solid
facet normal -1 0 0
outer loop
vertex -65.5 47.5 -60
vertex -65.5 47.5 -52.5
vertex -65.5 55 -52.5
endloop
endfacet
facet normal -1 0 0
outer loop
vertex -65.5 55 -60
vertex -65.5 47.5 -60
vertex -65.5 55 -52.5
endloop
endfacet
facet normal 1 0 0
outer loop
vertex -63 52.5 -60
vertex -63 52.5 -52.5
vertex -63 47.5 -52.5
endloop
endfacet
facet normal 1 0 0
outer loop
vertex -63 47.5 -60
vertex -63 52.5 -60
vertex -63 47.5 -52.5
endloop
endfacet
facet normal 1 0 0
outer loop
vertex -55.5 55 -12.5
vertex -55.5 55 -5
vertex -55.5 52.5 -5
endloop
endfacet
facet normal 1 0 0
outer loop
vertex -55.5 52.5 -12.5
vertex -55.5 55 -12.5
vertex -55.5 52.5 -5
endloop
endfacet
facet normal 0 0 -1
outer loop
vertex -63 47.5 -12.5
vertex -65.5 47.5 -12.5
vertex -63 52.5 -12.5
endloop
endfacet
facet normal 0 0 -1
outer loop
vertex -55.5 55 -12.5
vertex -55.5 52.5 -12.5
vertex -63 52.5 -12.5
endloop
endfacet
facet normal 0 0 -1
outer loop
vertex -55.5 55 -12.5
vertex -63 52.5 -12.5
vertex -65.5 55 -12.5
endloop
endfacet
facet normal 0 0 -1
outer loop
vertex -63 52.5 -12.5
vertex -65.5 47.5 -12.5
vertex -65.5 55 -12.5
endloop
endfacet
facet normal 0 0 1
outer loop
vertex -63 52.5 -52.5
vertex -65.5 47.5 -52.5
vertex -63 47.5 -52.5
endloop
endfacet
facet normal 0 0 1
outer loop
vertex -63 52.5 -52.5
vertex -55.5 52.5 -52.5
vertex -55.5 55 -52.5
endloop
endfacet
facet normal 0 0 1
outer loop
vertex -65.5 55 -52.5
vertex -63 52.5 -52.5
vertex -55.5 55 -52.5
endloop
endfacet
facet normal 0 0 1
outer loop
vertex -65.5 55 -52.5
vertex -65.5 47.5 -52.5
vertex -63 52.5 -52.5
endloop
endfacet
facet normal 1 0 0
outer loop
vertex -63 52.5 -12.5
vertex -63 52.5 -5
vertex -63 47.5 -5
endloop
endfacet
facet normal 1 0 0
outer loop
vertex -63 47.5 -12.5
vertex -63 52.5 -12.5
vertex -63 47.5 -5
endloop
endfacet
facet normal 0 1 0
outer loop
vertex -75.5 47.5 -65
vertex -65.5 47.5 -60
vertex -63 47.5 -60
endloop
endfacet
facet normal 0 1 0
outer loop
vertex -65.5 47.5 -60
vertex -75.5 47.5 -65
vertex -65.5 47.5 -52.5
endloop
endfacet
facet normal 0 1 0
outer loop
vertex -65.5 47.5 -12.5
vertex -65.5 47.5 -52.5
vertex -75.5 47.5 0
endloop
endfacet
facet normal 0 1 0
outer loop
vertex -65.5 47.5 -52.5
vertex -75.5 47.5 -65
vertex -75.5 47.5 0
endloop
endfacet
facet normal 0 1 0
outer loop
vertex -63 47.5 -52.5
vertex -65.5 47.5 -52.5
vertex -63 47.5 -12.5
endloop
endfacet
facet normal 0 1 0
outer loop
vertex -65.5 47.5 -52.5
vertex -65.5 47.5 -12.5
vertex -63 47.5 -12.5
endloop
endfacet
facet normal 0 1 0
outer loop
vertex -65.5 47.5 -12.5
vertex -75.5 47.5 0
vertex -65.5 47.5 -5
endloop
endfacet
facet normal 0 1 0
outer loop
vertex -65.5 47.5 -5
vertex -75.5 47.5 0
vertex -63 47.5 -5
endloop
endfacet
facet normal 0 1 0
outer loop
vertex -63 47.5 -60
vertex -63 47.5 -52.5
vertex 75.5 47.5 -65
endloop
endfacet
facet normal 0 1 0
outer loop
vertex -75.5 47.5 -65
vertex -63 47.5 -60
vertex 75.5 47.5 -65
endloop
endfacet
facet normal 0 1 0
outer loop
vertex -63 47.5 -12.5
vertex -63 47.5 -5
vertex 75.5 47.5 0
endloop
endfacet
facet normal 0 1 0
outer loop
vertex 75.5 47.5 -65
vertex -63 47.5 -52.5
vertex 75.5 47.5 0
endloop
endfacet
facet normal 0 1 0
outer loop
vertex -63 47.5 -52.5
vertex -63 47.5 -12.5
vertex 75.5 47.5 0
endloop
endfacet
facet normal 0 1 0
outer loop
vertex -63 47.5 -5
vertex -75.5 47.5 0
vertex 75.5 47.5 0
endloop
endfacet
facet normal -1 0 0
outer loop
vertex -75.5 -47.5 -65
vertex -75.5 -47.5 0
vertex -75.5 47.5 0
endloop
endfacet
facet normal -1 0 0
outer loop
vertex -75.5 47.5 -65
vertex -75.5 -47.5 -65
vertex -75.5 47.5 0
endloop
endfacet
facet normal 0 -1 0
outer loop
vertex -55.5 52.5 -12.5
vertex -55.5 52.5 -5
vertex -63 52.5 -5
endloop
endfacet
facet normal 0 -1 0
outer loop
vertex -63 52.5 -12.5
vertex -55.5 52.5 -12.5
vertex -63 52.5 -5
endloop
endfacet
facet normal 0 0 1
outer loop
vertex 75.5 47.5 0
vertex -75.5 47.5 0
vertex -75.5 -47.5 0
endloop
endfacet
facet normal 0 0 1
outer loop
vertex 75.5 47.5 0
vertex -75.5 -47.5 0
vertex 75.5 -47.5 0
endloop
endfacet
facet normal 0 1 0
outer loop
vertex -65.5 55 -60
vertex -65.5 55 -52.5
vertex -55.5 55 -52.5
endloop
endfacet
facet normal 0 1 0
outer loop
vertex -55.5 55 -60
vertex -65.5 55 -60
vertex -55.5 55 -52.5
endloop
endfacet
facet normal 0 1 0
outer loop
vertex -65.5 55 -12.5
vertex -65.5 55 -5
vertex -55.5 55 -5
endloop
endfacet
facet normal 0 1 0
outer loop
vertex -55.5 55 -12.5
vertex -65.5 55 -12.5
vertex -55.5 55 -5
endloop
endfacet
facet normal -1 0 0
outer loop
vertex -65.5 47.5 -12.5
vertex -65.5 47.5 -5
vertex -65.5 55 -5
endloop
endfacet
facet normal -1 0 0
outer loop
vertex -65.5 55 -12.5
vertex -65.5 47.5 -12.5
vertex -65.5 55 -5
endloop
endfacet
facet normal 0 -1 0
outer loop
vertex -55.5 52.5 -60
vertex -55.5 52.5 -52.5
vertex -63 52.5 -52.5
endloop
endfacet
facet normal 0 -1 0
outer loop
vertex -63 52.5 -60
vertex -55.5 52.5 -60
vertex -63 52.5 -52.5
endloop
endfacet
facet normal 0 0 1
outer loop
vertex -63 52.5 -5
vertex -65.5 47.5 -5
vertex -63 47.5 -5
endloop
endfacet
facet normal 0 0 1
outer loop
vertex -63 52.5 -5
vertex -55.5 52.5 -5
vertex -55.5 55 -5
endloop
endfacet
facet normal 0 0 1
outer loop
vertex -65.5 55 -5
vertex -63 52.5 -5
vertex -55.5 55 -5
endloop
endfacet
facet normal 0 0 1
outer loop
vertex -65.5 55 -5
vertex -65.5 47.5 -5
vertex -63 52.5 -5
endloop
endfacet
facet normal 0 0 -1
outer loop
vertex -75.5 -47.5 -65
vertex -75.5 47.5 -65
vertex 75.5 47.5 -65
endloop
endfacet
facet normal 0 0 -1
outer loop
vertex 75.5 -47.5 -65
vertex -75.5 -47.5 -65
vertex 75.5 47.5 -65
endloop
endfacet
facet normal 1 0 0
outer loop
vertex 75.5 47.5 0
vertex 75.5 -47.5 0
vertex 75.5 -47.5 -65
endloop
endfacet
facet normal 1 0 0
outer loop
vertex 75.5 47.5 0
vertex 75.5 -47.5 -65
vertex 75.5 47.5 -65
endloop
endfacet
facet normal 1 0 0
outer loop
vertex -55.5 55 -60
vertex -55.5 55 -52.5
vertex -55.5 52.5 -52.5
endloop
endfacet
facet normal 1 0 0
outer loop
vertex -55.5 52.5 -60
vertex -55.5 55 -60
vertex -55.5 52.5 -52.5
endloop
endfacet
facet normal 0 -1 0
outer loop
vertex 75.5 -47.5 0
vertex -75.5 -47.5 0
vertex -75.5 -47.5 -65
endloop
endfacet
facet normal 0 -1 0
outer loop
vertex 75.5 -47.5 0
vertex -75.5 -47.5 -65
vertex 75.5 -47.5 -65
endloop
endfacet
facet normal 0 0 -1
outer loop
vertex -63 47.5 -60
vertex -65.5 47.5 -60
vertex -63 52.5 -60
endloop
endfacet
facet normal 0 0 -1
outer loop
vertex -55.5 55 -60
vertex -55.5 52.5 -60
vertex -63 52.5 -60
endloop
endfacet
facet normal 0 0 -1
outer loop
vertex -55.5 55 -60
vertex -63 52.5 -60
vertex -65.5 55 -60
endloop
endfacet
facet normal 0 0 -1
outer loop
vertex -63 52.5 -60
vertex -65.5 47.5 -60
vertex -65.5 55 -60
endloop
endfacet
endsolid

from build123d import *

# Parameters (mm, degrees)
SKETCH1_W           = 151
SKETCH1_H           = 95
BOSS_EXTRUDE1_DEPTH = 65
BOSS_EXTRUDE2_DEPTH = 65
CUT_EXTRUDE1_REACH  = 143
SKETCH3_W           = 5
SKETCH3_H           = 7.5
SKETCH3_W_2         = 40


with BuildPart() as part:
    # Sketch1 → Boss-Extrude1 (new body)
    with BuildSketch(Plane.XY):
        Rectangle(SKETCH1_W, SKETCH1_H)
    extrude(amount=-BOSS_EXTRUDE1_DEPTH)

    # Sketch2 → Boss-Extrude2 (add)
    with BuildSketch(Plane.XY):
        Polygon((-65.5, 47.5), (-65.5, 55), (-55.5, 55), (-55.5, 52.5), (-63, 52.5), (-63, 47.5), align=None)
    extrude(amount=-BOSS_EXTRUDE2_DEPTH)

    # Sketch3 → Cut-Extrude1 (cut, up to next)
    with BuildSketch(Plane.ZY.offset(65.5), mode=Mode.PRIVATE) as cut_extrude1_sk1:
        with Locations((-62.5, 51.25)):
            Rectangle(SKETCH3_W, SKETCH3_H)
    cut_extrude1_tool1 = extrude(cut_extrude1_sk1.sketch, amount=-CUT_EXTRUDE1_REACH, mode=Mode.PRIVATE) & part.part
    add(cut_extrude1_tool1.solids().sort_by_distance((-65.5, 51.25, -62.5))[0], mode=Mode.SUBTRACT)
    # Sketch3 → Cut-Extrude1 (cut, up to next)
    with BuildSketch(Plane.ZY.offset(65.5), mode=Mode.PRIVATE) as cut_extrude1_sk2:
        with Locations((-32.5, 51.25)):
            Rectangle(SKETCH3_W_2, SKETCH3_H)
    cut_extrude1_tool2 = extrude(cut_extrude1_sk2.sketch, amount=-CUT_EXTRUDE1_REACH, mode=Mode.PRIVATE) & part.part
    add(cut_extrude1_tool2.solids().sort_by_distance((-65.5, 51.25, -32.5))[0], mode=Mode.SUBTRACT)
    # Sketch3 → Cut-Extrude1 (cut, up to next)
    with BuildSketch(Plane.ZY.offset(65.5), mode=Mode.PRIVATE) as cut_extrude1_sk3:
        with Locations((-2.5, 51.25)):
            Rectangle(SKETCH3_W, SKETCH3_H)
    cut_extrude1_tool3 = extrude(cut_extrude1_sk3.sketch, amount=-CUT_EXTRUDE1_REACH, mode=Mode.PRIVATE) & part.part
    add(cut_extrude1_tool3.solids().sort_by_distance((-65.5, 51.25, -2.5))[0], mode=Mode.SUBTRACT)


solid = part.part
